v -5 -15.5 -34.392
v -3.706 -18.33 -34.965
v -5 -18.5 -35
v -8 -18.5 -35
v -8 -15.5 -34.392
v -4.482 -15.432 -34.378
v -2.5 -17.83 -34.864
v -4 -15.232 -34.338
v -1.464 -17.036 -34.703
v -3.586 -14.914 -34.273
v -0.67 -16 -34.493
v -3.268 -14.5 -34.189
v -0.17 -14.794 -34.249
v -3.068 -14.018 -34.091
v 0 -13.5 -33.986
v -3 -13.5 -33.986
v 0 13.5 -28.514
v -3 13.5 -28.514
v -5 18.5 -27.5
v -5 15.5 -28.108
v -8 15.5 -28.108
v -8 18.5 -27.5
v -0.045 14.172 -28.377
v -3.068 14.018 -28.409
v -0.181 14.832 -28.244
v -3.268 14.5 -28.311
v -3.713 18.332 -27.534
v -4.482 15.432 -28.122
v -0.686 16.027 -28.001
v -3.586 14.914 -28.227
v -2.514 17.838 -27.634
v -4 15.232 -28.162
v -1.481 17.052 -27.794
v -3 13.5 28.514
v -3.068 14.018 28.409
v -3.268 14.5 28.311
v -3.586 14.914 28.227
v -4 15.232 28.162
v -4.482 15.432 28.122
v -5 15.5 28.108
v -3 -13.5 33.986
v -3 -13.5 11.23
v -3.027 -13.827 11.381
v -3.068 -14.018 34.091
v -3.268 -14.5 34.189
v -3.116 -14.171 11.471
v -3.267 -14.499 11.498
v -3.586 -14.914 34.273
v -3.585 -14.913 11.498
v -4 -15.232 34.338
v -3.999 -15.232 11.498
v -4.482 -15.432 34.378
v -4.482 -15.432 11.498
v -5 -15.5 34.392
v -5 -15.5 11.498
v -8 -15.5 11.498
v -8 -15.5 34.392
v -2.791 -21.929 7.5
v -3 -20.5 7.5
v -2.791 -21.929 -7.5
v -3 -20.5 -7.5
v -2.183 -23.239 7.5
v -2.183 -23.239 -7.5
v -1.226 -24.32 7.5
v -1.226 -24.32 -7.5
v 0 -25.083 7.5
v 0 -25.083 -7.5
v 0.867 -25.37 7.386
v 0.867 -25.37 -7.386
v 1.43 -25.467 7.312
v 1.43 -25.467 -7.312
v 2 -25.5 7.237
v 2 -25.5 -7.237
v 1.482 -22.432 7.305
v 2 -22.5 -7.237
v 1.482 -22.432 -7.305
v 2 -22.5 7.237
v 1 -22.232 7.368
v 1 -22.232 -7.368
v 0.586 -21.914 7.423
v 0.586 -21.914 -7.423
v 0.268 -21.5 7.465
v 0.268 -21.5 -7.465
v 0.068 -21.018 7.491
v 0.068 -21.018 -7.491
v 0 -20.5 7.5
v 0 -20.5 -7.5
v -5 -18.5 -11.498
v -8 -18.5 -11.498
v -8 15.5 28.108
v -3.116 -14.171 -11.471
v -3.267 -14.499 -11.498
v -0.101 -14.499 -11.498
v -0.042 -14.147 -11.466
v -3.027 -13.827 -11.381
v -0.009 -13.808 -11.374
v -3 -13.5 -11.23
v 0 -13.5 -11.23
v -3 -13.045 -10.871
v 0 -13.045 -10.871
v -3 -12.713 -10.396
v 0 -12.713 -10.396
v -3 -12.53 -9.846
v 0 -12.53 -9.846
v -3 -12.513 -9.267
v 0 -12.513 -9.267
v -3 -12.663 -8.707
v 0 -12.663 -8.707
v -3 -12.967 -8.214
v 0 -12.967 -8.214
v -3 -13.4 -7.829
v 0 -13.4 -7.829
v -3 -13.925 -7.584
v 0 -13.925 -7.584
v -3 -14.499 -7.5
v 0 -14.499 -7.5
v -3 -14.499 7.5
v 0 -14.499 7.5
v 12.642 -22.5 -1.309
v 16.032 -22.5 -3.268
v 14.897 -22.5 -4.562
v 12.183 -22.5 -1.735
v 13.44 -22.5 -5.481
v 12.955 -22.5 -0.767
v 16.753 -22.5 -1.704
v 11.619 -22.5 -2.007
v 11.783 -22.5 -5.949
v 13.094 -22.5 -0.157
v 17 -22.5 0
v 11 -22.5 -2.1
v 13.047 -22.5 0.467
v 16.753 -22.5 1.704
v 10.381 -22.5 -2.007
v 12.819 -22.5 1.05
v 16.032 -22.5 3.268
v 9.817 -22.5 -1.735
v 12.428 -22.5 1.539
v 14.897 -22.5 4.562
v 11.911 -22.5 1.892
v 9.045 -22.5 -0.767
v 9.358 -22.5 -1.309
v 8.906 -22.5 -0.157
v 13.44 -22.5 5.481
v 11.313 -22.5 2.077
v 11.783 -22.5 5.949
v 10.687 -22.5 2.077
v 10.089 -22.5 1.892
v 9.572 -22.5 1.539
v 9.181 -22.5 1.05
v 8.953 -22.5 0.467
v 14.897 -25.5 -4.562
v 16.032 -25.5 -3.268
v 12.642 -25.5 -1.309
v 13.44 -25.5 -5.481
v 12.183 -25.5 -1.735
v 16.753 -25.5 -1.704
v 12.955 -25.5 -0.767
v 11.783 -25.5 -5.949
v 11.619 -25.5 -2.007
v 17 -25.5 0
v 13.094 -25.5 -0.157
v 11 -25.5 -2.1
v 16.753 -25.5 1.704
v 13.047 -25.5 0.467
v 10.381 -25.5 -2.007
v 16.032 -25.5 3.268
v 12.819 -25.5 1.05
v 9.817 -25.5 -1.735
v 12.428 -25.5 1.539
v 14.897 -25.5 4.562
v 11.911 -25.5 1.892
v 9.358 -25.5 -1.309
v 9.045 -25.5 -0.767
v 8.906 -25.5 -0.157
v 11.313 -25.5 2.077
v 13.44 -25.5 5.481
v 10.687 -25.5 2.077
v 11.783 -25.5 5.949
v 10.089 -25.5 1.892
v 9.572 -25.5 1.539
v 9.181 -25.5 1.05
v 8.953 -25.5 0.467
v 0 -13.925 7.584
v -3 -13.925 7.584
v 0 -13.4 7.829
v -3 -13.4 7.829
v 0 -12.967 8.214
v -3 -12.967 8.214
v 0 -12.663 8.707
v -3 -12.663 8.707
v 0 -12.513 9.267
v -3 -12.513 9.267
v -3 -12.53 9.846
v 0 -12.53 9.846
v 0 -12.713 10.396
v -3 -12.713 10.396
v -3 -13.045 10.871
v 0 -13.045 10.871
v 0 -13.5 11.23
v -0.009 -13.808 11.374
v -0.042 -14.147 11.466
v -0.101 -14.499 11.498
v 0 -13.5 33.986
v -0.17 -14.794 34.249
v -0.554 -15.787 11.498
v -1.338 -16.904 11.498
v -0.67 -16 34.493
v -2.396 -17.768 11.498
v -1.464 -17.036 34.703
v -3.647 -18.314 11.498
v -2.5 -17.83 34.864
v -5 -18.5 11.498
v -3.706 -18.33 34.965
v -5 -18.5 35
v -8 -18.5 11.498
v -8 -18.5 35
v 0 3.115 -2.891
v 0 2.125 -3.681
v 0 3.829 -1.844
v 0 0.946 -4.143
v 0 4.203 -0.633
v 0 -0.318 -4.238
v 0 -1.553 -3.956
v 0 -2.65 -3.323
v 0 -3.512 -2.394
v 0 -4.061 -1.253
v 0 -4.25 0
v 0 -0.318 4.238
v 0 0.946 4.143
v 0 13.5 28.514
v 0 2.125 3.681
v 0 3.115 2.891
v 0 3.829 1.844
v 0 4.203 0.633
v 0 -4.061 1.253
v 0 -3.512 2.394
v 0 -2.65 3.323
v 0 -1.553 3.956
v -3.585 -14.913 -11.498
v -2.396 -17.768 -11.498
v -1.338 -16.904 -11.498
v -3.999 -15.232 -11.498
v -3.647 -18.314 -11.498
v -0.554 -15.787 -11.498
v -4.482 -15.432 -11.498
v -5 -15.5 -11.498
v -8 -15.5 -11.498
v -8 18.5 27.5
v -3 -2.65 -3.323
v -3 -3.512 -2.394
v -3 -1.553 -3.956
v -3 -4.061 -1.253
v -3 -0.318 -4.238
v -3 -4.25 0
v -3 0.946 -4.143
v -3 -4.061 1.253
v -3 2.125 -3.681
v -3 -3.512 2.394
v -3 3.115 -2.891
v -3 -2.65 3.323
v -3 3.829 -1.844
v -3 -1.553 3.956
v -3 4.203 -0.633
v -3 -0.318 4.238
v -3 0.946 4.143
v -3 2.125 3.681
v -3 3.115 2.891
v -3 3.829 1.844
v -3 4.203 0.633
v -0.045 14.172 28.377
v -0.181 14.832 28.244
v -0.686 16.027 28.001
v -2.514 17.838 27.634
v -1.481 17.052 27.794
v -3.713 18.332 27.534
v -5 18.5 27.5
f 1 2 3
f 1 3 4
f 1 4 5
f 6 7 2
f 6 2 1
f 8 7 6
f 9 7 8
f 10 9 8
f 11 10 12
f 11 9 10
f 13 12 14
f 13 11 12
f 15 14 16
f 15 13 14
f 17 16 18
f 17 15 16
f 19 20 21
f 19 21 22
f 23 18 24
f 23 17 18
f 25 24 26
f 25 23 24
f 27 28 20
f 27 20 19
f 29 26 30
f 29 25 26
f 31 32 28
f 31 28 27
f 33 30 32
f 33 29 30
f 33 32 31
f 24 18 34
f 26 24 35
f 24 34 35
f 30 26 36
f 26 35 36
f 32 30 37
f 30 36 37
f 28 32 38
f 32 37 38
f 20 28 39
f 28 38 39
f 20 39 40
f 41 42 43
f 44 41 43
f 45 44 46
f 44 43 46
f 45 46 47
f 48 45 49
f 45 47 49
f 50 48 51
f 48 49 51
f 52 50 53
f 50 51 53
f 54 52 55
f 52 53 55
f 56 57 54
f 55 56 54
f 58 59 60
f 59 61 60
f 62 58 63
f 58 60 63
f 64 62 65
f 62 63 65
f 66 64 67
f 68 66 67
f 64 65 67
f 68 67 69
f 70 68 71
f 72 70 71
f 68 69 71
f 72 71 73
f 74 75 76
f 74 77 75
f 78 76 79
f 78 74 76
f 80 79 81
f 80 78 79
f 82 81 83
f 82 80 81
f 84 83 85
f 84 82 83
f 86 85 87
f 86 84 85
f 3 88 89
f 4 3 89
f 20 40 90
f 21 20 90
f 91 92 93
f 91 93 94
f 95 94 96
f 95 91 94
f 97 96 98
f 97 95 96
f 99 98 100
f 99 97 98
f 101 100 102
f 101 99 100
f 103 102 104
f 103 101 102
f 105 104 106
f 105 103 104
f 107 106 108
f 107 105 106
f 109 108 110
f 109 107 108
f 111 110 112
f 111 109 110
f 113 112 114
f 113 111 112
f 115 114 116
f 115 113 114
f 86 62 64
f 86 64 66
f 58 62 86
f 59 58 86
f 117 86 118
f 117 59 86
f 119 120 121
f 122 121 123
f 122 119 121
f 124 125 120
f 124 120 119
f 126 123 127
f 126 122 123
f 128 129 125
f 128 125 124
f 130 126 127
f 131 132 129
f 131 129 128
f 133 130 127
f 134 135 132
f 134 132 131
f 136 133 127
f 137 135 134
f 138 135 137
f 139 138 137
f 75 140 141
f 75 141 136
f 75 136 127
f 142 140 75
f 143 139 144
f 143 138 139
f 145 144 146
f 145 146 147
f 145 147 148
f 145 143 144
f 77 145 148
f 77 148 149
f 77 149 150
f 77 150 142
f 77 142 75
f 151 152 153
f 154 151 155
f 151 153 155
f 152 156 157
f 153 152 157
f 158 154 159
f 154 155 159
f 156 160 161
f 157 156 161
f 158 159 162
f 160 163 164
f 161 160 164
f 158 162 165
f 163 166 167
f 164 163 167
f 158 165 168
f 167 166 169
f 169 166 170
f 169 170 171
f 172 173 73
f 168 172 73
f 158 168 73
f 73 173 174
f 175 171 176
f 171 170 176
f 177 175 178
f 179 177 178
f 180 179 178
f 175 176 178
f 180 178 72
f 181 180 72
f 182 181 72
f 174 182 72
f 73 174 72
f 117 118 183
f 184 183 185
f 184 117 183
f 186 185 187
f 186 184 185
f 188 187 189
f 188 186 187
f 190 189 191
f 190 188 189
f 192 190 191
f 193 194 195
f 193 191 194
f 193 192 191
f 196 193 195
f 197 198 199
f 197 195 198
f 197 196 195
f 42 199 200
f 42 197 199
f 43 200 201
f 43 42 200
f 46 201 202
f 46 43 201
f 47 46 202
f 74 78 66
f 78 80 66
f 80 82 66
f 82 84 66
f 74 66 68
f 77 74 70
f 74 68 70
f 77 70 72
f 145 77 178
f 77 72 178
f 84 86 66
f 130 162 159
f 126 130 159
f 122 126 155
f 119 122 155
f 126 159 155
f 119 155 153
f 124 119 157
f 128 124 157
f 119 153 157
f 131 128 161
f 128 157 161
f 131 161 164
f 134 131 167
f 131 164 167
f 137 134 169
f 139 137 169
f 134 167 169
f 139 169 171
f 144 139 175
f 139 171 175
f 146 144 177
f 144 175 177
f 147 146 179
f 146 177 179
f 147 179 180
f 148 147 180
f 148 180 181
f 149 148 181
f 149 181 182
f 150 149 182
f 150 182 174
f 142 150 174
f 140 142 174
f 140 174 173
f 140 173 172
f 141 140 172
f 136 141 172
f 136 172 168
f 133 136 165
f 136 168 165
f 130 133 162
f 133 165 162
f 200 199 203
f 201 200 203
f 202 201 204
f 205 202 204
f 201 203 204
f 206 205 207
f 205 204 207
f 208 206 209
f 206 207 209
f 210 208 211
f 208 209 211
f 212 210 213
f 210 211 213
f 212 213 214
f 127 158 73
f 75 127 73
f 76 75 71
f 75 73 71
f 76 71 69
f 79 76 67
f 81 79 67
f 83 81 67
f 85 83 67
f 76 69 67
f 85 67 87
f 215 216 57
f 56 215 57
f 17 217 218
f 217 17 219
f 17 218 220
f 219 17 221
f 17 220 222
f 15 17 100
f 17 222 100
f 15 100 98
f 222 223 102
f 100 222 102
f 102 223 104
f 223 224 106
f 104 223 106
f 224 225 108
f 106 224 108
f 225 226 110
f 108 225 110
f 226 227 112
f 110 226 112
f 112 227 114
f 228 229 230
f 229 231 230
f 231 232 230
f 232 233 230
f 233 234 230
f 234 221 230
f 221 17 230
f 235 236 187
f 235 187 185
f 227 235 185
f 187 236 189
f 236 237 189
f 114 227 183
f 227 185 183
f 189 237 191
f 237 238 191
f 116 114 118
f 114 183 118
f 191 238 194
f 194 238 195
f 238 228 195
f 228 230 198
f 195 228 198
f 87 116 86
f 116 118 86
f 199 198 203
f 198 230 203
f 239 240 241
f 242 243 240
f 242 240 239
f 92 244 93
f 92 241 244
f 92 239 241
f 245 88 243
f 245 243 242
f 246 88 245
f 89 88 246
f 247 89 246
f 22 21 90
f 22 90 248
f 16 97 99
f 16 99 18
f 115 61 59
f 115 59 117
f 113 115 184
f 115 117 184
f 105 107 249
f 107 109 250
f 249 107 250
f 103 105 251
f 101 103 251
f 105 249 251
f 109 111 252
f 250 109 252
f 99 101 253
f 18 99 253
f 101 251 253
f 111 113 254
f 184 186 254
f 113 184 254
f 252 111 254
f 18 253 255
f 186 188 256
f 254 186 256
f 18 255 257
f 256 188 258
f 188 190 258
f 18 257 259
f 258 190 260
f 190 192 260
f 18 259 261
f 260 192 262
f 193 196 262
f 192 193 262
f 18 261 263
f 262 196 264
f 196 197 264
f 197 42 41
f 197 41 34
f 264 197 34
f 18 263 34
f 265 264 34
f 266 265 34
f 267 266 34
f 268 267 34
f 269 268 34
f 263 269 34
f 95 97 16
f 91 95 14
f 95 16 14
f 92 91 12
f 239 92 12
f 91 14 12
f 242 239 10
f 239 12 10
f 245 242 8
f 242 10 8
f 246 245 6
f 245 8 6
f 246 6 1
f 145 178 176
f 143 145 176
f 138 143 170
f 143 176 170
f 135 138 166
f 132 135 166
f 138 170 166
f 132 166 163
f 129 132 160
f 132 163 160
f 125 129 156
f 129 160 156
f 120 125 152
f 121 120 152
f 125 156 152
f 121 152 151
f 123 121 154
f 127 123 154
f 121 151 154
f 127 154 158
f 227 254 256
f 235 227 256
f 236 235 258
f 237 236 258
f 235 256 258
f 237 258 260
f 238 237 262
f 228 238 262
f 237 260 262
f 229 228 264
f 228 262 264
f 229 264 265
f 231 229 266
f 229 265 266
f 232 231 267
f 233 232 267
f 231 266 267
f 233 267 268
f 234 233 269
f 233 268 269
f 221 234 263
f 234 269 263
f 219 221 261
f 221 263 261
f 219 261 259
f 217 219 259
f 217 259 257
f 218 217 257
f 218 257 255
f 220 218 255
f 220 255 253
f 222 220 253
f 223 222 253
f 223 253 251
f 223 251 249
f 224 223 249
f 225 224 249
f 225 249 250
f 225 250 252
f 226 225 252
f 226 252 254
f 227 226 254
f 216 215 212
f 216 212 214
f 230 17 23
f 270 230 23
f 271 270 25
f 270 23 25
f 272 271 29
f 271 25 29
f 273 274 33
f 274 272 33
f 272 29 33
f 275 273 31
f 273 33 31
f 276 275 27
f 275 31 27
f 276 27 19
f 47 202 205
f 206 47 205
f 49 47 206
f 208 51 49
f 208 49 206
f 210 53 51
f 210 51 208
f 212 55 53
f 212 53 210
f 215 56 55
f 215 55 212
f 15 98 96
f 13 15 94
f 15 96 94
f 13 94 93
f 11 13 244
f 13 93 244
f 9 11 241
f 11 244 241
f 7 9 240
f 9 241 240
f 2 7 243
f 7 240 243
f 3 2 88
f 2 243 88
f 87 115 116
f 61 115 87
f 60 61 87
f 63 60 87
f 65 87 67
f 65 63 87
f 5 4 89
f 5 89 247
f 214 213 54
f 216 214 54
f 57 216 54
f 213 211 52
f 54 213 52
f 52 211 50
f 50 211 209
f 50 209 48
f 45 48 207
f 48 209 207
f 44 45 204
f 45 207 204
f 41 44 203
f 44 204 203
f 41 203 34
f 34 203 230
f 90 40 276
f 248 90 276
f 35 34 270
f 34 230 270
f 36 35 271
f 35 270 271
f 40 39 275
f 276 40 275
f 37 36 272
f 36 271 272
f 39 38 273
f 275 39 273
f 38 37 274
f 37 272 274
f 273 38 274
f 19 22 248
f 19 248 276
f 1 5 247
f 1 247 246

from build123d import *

# Parameters (mm, degrees)
EXTRUSION1_DEPTH         = 35
ENL_V_MAT_EXTRU_1_DEPTH  = 45.036916332
ESQUISSE8_W              = 15
ESQUISSE8_H              = 3
ENL_V_MAT_EXTRU_8_DEPTH  = 44.591857038
ESQUISSE9_W              = 23.50235156
ESQUISSE9_H              = 7
ENL_V_MAT_EXTRU_9_DEPTH  = 44.591857038
ESQUISSE11_R             = 2.1
EXTRUSION2_DEPTH         = 3
ESQUISSE12_R             = 4.25
ENL_V_MAT_EXTRU_10_DEPTH = 48.699580711
CONG_3_R                 = 2
CONG_4_R                 = 5
ENL_V_MAT_EXTRU_11_DEPTH = 47.521500481


with BuildPart() as part:
    # Esquisse1 → Extrusion1 (new, symmetric)
    with BuildSketch(Plane.XY):
        Polygon((-8, 18.5), (0, 18.5), (0, -25.5), (-3, -25.5), (-3, -18.5), (-8, -18.5), (-8, -15.5), (-3, -15.5), (-3, 15.5), (-8, 15.5), align=None)
    extrude(amount=EXTRUSION1_DEPTH, both=True)

    # Esquisse2 → Enlèv. mat.-Extru.1 (cut, through all)
    with BuildSketch(Plane.ZY.offset(8)):
        with BuildLine():
            Line((-11.49764844, -25.5), (-11.49764844, -14.49882422))
            ThreePointArc((-11.49764844, -14.49882422), (-9.49882422, -12.5), (-7.5, -14.49882422))
            Line((-7.5, -14.49882422), (-7.5, -25.5))
            Line((-7.5, -25.5), (-11.49764844, -25.5))
        make_face()
        with BuildLine():
            Line((7.5, -25.5), (7.5, -14.49882422))
            ThreePointArc((7.5, -14.49882422), (9.49882422, -12.5), (11.49764844, -14.49882422))
            Line((11.49764844, -14.49882422), (11.49764844, -25.5))
            Line((11.49764844, -25.5), (7.5, -25.5))
        make_face()
    extrude(amount=-ENL_V_MAT_EXTRU_1_DEPTH, mode=Mode.SUBTRACT)

    # Esquisse8 → Enlèv. mat.-Extru.8 (cut, through all)
    with BuildSketch(Plane.ZY.offset(3)):
        with Locations((0, -17)):
            Rectangle(ESQUISSE8_W, ESQUISSE8_H)
    extrude(amount=ENL_V_MAT_EXTRU_8_DEPTH, mode=Mode.SUBTRACT)

    # Esquisse9 → Enlèv. mat.-Extru.9 (cut, through all)
    with BuildSketch(Plane.ZY.offset(3)):
        with Locations((-23.24882422, -22)):
            Rectangle(ESQUISSE9_W, ESQUISSE9_H)
        with Locations((23.24882422, -22)):
            Rectangle(ESQUISSE9_W, ESQUISSE9_H)
    extrude(amount=-ENL_V_MAT_EXTRU_9_DEPTH, mode=Mode.SUBTRACT)

    # Esquisse11 → Extrusion2 (add)
    with BuildSketch(Plane.XZ.offset(25.5)):
        with BuildLine():
            Line((0, 7.5), (11.783181352, 5.948665982))
            ThreePointArc((11.783181352, 5.948665982), (17, 0), (11.783181352, -5.948665982))
            Line((11.783181352, -5.948665982), (0, -7.5))
            Line((0, -7.5), (0, 7.5))
        make_face()
        with Locations(Location((11, 0, 0), (0, 0, 270))):
            Circle(ESQUISSE11_R, mode=Mode.SUBTRACT)
    extrude(amount=-EXTRUSION2_DEPTH)

    # Esquisse12 → Enlèv. mat.-Extru.10 (cut, through all)
    with BuildSketch(Plane.ZY.offset(3)):
        with Locations(Location((0, 0, 0), (0, 0, 270))):
            Circle(ESQUISSE12_R)
    extrude(amount=-ENL_V_MAT_EXTRU_10_DEPTH, mode=Mode.SUBTRACT)

    # Congé3
    cong_3_edges = [part.edges().sort_by_distance(p)[0] for p in [
        (0, -22.5, 0),
        (-3, -15.5, 23.24882422),
        (-3, 15.5, 0),
        (-3, -15.5, -23.24882422),
    ]]
    fillet(cong_3_edges, radius=CONG_3_R)

    # Congé4
    cong_4_edges = [part.edges().sort_by_distance(p)[0] for p in [
        (0, -18.5, -23.24882422),
        (0, -18.5, 23.24882422),
        (0, 18.5, 0),
        (-3, -25.5, 0),
    ]]
    fillet(cong_4_edges, radius=CONG_4_R)

    # Esquisse13 → Enlèv. mat.-Extru.11 (cut, through all)
    with BuildSketch(Plane(origin=(0, 0, 0), x_dir=(0, 0, -1), z_dir=(1, 0, 0))):
        Polygon((-35, 18.5), (-35, -18.5), (-27.5, 18.5), align=None)
        Polygon((35, 18.5), (35, -18.5), (27.5, 18.5), align=None)
    extrude(amount=-ENL_V_MAT_EXTRU_11_DEPTH, mode=Mode.SUBTRACT)


solid = part.part
